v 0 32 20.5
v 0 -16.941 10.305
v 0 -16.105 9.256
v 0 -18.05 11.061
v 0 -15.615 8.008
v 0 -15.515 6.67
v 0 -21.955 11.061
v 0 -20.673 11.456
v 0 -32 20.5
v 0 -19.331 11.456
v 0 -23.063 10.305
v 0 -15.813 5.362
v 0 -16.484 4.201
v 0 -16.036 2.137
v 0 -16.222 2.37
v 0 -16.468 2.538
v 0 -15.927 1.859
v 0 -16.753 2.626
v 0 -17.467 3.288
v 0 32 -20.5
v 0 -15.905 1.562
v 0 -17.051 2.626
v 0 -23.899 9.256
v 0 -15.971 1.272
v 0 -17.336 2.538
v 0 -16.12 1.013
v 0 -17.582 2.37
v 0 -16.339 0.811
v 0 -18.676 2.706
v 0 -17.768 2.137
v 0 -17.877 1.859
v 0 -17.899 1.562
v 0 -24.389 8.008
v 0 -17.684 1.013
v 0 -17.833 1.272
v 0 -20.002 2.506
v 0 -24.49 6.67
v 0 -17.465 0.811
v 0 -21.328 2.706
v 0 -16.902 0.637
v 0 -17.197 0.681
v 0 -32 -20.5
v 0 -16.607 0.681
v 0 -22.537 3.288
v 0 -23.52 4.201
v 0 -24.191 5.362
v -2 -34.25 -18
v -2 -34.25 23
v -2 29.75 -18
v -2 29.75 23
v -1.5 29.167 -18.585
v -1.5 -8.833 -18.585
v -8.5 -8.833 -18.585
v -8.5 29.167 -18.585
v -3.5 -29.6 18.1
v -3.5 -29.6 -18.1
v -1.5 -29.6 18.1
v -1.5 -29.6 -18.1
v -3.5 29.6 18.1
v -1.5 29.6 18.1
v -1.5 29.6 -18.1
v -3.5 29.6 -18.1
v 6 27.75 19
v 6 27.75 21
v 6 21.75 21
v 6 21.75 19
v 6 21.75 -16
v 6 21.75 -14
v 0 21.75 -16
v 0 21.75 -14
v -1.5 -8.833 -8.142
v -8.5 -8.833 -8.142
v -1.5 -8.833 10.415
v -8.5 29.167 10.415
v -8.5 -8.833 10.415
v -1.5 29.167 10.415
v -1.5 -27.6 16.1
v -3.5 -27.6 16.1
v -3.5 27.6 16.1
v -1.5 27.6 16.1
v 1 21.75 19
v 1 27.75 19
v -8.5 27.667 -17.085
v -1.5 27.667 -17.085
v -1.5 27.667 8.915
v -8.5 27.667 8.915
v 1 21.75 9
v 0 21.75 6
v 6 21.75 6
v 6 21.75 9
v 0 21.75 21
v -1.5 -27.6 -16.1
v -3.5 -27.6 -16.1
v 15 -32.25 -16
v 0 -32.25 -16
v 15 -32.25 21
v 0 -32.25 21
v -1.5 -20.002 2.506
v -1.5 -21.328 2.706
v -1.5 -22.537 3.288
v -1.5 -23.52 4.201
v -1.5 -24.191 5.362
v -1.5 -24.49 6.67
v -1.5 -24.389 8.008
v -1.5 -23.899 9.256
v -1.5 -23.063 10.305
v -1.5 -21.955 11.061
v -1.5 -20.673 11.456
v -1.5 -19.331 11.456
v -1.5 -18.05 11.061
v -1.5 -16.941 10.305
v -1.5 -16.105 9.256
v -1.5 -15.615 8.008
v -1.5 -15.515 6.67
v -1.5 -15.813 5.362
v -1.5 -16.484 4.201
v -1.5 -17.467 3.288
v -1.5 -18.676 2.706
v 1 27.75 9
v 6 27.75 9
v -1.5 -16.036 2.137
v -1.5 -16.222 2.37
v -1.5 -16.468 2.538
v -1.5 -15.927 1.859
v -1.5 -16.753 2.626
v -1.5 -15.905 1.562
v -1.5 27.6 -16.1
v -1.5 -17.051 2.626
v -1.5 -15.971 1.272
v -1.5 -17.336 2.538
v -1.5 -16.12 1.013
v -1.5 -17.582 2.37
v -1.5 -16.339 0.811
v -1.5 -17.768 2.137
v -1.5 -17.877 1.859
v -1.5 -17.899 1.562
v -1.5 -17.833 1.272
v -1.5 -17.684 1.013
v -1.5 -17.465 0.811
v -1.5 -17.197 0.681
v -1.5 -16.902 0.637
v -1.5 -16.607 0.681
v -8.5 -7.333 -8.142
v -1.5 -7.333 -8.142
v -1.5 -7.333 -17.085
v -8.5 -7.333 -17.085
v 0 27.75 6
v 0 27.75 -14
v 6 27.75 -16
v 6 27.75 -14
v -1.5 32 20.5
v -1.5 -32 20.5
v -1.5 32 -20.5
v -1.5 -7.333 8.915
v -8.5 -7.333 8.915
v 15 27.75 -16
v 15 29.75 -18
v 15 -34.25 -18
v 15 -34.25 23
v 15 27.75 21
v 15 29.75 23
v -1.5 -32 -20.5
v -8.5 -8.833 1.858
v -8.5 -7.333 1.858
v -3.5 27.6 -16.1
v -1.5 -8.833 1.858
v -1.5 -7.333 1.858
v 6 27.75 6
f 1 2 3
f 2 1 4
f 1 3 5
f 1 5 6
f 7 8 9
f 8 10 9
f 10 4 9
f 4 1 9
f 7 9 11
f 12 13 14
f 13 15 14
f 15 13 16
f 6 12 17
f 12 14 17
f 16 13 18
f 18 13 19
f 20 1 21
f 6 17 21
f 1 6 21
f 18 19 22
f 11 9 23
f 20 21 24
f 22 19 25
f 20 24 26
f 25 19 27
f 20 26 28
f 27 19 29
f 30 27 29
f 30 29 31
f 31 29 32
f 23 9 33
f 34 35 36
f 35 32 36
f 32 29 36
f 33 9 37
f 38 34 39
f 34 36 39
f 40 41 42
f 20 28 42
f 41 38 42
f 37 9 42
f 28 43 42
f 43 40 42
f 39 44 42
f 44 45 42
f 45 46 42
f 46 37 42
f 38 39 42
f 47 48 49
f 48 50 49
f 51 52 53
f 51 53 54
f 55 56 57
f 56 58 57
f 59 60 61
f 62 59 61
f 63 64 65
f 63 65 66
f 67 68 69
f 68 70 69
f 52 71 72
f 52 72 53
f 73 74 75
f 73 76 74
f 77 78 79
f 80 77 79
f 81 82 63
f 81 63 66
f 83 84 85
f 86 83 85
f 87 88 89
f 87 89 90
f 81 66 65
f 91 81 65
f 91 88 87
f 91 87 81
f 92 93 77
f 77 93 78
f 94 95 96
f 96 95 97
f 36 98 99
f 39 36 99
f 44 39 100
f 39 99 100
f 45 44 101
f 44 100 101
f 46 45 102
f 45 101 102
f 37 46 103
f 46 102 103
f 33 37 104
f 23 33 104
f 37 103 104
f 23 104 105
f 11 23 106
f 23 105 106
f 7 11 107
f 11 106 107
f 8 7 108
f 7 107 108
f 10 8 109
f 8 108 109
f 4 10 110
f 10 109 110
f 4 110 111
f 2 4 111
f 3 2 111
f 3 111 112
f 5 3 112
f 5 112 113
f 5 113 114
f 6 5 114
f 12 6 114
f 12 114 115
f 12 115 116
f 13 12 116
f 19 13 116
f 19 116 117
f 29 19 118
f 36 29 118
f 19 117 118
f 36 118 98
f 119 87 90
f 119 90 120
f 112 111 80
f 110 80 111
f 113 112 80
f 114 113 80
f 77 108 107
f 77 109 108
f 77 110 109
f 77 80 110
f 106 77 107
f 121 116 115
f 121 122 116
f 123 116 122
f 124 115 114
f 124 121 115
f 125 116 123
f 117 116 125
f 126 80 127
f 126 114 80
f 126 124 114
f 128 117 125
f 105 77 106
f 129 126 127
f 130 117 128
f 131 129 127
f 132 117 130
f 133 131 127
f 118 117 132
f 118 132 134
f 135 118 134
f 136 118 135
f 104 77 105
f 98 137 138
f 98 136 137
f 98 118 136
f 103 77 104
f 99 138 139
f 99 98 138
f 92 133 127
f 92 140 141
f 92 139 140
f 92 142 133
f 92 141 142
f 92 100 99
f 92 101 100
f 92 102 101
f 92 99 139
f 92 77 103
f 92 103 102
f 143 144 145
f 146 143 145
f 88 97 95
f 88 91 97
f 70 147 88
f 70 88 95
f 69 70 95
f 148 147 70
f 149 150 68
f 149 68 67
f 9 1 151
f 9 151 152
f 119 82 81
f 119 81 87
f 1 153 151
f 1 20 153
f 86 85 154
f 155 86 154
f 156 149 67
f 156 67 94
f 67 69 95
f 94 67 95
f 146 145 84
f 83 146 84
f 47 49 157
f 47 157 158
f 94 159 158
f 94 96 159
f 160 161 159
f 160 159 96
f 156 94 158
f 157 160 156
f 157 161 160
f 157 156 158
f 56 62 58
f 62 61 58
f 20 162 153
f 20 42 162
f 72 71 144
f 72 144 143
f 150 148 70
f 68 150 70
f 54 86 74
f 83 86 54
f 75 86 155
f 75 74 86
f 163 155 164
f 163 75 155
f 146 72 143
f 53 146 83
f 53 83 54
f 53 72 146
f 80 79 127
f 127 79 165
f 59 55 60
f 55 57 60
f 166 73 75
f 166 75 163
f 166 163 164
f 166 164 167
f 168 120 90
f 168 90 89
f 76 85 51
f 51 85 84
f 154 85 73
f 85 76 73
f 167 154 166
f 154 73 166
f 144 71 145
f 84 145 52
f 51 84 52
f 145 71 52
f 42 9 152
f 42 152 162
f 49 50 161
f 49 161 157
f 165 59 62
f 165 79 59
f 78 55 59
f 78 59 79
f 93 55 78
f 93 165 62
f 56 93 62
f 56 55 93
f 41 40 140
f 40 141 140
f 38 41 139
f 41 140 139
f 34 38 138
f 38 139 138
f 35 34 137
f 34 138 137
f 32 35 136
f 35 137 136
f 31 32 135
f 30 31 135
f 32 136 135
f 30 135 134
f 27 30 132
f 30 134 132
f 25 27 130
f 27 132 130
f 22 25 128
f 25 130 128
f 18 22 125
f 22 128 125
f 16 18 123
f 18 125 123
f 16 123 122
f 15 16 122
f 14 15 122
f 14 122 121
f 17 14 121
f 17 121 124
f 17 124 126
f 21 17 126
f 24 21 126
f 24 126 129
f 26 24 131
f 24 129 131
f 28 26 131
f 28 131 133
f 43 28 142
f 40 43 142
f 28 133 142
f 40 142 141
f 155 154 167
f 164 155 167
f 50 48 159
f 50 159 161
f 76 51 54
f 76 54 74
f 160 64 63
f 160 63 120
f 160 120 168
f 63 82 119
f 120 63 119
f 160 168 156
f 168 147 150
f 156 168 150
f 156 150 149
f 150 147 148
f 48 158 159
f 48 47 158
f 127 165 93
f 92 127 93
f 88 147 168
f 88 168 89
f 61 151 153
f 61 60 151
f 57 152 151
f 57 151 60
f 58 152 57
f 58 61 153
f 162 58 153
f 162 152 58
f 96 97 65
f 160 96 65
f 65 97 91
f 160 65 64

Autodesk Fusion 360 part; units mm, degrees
sketch "Sketch1" plane through (0, 0, 0) normal (0, 0, 1) x (1, 0, 0) in component "D1 holder"
sketch "Sketch2" plane through (0, 0, 0) normal (1, 0, 0) x (0, 0, -1) in component "D1 holder"
  line L0 (-20.5, 32) -> (20.5, 32)
  line L1 (20.5, 32) -> (20.5, -32)
  line L2 (20.5, -32) -> (-20.5, -32)
  line L3 (-20.5, -32) -> (-20.5, 32)
  line L4 (-20.5, 32) -> (20.5, -32) construction
  line L5 (20.5, 32) -> (-20.5, -32) construction
  dimension "d27" = 41
  dimension "d28" = 64
extrude "Extrude1" add sketch "Sketch2" along normal blind 1.5 makes body 1 in component "D1 holder"
sketch "Sketch3" plane through (1.5, 0, 0) normal (1, 0, 0) x (0, 0, -1) in component "D1 holder"
  line L0 (-20.5, -32) -> (20.5, -32)
  line L1 (20.5, -32) -> (20.5, 32)
  line L2 (20.5, 32) -> (-20.5, 32)
  line L3 (-20.5, 32) -> (-20.5, -32)
  line L4 (-18.1, 29.6) -> (-18.1, -29.6)
  line L5 (-18.1, -29.6) -> (18.1, -29.6)
  line L6 (18.1, -29.6) -> (18.1, 29.6)
  line L7 (18.1, 29.6) -> (-18.1, 29.6)
  dimension "d31" = 2.4
extrude "Extrude2" add sketch "Sketch3" along normal blind 2 contours L4 L5 L6 L7 bodies 1 in component "D1 holder"
sketch "Sketch4" plane through (3.5, 0, 0) normal (1, 0, 0) x (0, 0, -1) in component "D1 holder"
  line L0 (18.1, 29.6) -> (-18.1, 29.6)
  line L1 (-18.1, 29.6) -> (-18.1, -29.6)
  line L2 (-18.1, -29.6) -> (18.1, -29.6)
  line L3 (18.1, -29.6) -> (18.1, 29.6)
  line L4 (-16.1, 27.6) -> (-16.1, -27.6)
  line L5 (-16.1, -27.6) -> (16.1, -27.6)
  line L6 (16.1, -27.6) -> (16.1, 27.6)
  line L7 (16.1, 27.6) -> (-16.1, 27.6)
  dimension "d34" = 2
extrude "Extrude3" cut sketch "Sketch4" against normal blind 2 contours L4 L5 L6 L7 bodies 1 in component "D1 holder"
sketch "Sketch8" plane through (1.5, 0, 0) normal (1, 0, 0) x (0, 0, -1) in component "D1 holder"
  line L0 (18.5846, -29.167) -> (-10.4154, -29.167)
  line L1 (-10.4154, -29.167) -> (-10.4154, 8.833)
  line L2 (-10.4154, 8.833) -> (18.5846, 8.833)
  line L3 (18.5846, 8.833) -> (18.5846, -29.167)
  line L4 (17.0846, -27.667) -> (-8.9154, -27.667)
  line L5 (-8.9154, -27.667) -> (-8.9154, 7.333)
  line L6 (-8.9154, 7.333) -> (17.0846, 7.333)
  line L7 (17.0846, 7.333) -> (17.0846, -27.667)
  dimension "d39" = 29
  dimension "d40" = 38
  dimension "d41" = 1.5
extrude "Extrude4" add sketch "Sketch8" along normal blind 7 separate body makes body 2 in component "D1 holder"
sketch "Sketch9" plane through (0, 8.833, 0) normal (0, 1, 0) x (-1, 0, 0) in component "D1 holder"
  line L0 (-1.5, -18.5846) -> (-1.5, 10.4154)
  line L1 (-1.5, 10.4154) -> (-8.5, 10.4154)
  line L2 (-8.5, 10.4154) -> (-8.5, -18.5846)
  line L3 (-8.5, -18.5846) -> (-1.5, -18.5846)
  line L4 (-1.5, -8.142) -> (-8.9091, -8.142)
  line L5 (-8.9091, -8.142) -> (-8.9091, 1.858)
  line L6 (-8.9091, 1.858) -> (-1.5, 1.858)
  line L7 (-1.5, 1.858) -> (-1.5, -8.142)
  dimension "d44" = 10
extrude "Extrude5" cut sketch "Sketch9" against normal blind 1.5 contours L0 L2 L4 L6 L7 bodies 2 in component "D1 holder"
sketch "sensor hole" plane through (3.5, 0, 0) normal (1, 0, 0) x (0, 0, -1) in component "D1 holder"
  circle A0 centre (-7.0063, 20.0021) radius 4.5
  dimension "d47" = 9
extrude "Extrude6" cut sketch "sensor hole" against normal blind 26 bodies 1 in component "D1 holder"
sketch "screw hole" plane through (3.5, 0, 0) normal (1, 0, 0) x (0, 0, -1) in component "D1 holder"
  line L0 (-7.0063, 20.0021) -> (-1.6369, 16.9021)
  line L1 (-7.0063, 20.0021) -> (-1.0063, 20.0021) construction
  circle A0 centre (-1.6369, 16.9021) radius 1
  point P0 (-7.0063, 20.0021)
  dimension "d130" = 30
  dimension "d131" = 6.2
  dimension "d132" = 2
extrude "Extrude7" cut sketch "screw hole" against normal blind 4 bodies 1 in component "D1 holder"
sketch "Sketch6" plane through (0, 0, 0) normal (1, 0, 0) x (0, 0, -1) in component "BL-5C Battery box"
  line L0 (-23, 29.75) -> (18, 29.75)
  line L1 (18, 29.75) -> (18, -34.25)
  line L2 (18, -34.25) -> (-23, -34.25)
  line L3 (-23, -34.25) -> (-23, 29.75)
  point P0 (-23, 29.75)
  dimension "d107" = 41
  dimension "d108" = 64
extrude "Extrude5'" add sketch "Sketch6" against normal blind 2 separate body makes body 3 in component "BL-5C Battery box"
sketch "Sketch7" plane through (0, 0, 0) normal (1, 0, 0) x (0, 0, -1) in component "BL-5C Battery box"
  line L0 (-23, 29.75) -> (18, 29.75)
  line L1 (18, 29.75) -> (18, -34.25)
  line L2 (18, -34.25) -> (-23, -34.25)
  line L3 (-23, -34.25) -> (-23, 29.75)
  line L4 (16, 27.75) -> (16, -32.25)
  line L5 (16, -32.25) -> (-21, -32.25)
  line L6 (-21, -32.25) -> (-21, 27.75)
  line L7 (-21, 27.75) -> (16, 27.75)
  line L8 (16, 27.75) -> (14, 27.75)
  line L9 (14, 27.75) -> (14, 21.75)
  line L10 (14, 21.75) -> (16, 21.75)
  line L11 (16, 21.75) -> (16, 27.75)
  point P0 (-23, 29.75)
  point P1 (18, -34.25)
  dimension "d111" = 2
  dimension "d126" = 2
  dimension "d127" = 6
extrude "Extrude10" add sketch "Sketch7" along normal blind 6 contours L4 L7 L8 L9 L10 L11 bodies 3 in component "BL-5C Battery box"
extrude "Extrude6'" add sketch "Sketch7" along normal blind 15 bodies 3 in component "BL-5C Battery box"
sketch "Sketch8 (2)" plane through (0, 0, 0) normal (1, 0, 0) x (0, 0, -1) in component "BL-5C Battery box"
  line L0 (-21, 27.75) -> (-19, 27.75)
  line L1 (-19, 27.75) -> (-19, 21.75)
  line L2 (-19, 21.75) -> (-21, 21.75)
  line L3 (-21, 21.75) -> (-21, 27.75)
  point P0 (-21, 27.75)
  dimension "d114" = 6
  dimension "d115" = 2
extrude "Extrude7'" add sketch "Sketch8 (2)" along normal blind 6 bodies 3 in component "BL-5C Battery box"
sketch "Sketch9 (2)" plane through (0, 0, 0) normal (1, 0, 0) x (0, 0, -1) in component "BL-5C Battery box"
  line L0 (-19, 27.75) -> (-9, 27.75)
  line L1 (-9, 27.75) -> (-9, 21.75)
  line L2 (-9, 21.75) -> (-19, 21.75)
  line L3 (-19, 21.75) -> (-19, 27.75)
  point P0 (-19, 27.75)
  dimension "d118" = 6
  dimension "d119" = 10
extrude "Extrude8" add sketch "Sketch9 (2)" along normal blind 1 bodies 3 in component "BL-5C Battery box"
sketch "Sketch10" plane through (0, 0, 0) normal (1, 0, 0) x (0, 0, -1) in component "BL-5C Battery box"
  line L0 (-9, 27.75) -> (-6, 27.75)
  line L1 (-6, 27.75) -> (-6, 21.75)
  line L2 (-6, 21.75) -> (-9, 21.75)
  line L3 (-9, 21.75) -> (-9, 27.75)
  point P0 (-9, 27.75)
  dimension "d122" = 3
  dimension "d123" = 6
extrude "Extrude9" add sketch "Sketch10" along normal blind 6 bodies 3 in component "BL-5C Battery box"
component "D1 holder" placed x (-1, 0, 0) y (0, -1, 0) z (0, 0, 1) at (0, 0, 0)
component "BL-5C Battery box" placed x (1, 0, 0) y (0, 1, 0) z (0, 0, 1) at (0, 0, 0)
